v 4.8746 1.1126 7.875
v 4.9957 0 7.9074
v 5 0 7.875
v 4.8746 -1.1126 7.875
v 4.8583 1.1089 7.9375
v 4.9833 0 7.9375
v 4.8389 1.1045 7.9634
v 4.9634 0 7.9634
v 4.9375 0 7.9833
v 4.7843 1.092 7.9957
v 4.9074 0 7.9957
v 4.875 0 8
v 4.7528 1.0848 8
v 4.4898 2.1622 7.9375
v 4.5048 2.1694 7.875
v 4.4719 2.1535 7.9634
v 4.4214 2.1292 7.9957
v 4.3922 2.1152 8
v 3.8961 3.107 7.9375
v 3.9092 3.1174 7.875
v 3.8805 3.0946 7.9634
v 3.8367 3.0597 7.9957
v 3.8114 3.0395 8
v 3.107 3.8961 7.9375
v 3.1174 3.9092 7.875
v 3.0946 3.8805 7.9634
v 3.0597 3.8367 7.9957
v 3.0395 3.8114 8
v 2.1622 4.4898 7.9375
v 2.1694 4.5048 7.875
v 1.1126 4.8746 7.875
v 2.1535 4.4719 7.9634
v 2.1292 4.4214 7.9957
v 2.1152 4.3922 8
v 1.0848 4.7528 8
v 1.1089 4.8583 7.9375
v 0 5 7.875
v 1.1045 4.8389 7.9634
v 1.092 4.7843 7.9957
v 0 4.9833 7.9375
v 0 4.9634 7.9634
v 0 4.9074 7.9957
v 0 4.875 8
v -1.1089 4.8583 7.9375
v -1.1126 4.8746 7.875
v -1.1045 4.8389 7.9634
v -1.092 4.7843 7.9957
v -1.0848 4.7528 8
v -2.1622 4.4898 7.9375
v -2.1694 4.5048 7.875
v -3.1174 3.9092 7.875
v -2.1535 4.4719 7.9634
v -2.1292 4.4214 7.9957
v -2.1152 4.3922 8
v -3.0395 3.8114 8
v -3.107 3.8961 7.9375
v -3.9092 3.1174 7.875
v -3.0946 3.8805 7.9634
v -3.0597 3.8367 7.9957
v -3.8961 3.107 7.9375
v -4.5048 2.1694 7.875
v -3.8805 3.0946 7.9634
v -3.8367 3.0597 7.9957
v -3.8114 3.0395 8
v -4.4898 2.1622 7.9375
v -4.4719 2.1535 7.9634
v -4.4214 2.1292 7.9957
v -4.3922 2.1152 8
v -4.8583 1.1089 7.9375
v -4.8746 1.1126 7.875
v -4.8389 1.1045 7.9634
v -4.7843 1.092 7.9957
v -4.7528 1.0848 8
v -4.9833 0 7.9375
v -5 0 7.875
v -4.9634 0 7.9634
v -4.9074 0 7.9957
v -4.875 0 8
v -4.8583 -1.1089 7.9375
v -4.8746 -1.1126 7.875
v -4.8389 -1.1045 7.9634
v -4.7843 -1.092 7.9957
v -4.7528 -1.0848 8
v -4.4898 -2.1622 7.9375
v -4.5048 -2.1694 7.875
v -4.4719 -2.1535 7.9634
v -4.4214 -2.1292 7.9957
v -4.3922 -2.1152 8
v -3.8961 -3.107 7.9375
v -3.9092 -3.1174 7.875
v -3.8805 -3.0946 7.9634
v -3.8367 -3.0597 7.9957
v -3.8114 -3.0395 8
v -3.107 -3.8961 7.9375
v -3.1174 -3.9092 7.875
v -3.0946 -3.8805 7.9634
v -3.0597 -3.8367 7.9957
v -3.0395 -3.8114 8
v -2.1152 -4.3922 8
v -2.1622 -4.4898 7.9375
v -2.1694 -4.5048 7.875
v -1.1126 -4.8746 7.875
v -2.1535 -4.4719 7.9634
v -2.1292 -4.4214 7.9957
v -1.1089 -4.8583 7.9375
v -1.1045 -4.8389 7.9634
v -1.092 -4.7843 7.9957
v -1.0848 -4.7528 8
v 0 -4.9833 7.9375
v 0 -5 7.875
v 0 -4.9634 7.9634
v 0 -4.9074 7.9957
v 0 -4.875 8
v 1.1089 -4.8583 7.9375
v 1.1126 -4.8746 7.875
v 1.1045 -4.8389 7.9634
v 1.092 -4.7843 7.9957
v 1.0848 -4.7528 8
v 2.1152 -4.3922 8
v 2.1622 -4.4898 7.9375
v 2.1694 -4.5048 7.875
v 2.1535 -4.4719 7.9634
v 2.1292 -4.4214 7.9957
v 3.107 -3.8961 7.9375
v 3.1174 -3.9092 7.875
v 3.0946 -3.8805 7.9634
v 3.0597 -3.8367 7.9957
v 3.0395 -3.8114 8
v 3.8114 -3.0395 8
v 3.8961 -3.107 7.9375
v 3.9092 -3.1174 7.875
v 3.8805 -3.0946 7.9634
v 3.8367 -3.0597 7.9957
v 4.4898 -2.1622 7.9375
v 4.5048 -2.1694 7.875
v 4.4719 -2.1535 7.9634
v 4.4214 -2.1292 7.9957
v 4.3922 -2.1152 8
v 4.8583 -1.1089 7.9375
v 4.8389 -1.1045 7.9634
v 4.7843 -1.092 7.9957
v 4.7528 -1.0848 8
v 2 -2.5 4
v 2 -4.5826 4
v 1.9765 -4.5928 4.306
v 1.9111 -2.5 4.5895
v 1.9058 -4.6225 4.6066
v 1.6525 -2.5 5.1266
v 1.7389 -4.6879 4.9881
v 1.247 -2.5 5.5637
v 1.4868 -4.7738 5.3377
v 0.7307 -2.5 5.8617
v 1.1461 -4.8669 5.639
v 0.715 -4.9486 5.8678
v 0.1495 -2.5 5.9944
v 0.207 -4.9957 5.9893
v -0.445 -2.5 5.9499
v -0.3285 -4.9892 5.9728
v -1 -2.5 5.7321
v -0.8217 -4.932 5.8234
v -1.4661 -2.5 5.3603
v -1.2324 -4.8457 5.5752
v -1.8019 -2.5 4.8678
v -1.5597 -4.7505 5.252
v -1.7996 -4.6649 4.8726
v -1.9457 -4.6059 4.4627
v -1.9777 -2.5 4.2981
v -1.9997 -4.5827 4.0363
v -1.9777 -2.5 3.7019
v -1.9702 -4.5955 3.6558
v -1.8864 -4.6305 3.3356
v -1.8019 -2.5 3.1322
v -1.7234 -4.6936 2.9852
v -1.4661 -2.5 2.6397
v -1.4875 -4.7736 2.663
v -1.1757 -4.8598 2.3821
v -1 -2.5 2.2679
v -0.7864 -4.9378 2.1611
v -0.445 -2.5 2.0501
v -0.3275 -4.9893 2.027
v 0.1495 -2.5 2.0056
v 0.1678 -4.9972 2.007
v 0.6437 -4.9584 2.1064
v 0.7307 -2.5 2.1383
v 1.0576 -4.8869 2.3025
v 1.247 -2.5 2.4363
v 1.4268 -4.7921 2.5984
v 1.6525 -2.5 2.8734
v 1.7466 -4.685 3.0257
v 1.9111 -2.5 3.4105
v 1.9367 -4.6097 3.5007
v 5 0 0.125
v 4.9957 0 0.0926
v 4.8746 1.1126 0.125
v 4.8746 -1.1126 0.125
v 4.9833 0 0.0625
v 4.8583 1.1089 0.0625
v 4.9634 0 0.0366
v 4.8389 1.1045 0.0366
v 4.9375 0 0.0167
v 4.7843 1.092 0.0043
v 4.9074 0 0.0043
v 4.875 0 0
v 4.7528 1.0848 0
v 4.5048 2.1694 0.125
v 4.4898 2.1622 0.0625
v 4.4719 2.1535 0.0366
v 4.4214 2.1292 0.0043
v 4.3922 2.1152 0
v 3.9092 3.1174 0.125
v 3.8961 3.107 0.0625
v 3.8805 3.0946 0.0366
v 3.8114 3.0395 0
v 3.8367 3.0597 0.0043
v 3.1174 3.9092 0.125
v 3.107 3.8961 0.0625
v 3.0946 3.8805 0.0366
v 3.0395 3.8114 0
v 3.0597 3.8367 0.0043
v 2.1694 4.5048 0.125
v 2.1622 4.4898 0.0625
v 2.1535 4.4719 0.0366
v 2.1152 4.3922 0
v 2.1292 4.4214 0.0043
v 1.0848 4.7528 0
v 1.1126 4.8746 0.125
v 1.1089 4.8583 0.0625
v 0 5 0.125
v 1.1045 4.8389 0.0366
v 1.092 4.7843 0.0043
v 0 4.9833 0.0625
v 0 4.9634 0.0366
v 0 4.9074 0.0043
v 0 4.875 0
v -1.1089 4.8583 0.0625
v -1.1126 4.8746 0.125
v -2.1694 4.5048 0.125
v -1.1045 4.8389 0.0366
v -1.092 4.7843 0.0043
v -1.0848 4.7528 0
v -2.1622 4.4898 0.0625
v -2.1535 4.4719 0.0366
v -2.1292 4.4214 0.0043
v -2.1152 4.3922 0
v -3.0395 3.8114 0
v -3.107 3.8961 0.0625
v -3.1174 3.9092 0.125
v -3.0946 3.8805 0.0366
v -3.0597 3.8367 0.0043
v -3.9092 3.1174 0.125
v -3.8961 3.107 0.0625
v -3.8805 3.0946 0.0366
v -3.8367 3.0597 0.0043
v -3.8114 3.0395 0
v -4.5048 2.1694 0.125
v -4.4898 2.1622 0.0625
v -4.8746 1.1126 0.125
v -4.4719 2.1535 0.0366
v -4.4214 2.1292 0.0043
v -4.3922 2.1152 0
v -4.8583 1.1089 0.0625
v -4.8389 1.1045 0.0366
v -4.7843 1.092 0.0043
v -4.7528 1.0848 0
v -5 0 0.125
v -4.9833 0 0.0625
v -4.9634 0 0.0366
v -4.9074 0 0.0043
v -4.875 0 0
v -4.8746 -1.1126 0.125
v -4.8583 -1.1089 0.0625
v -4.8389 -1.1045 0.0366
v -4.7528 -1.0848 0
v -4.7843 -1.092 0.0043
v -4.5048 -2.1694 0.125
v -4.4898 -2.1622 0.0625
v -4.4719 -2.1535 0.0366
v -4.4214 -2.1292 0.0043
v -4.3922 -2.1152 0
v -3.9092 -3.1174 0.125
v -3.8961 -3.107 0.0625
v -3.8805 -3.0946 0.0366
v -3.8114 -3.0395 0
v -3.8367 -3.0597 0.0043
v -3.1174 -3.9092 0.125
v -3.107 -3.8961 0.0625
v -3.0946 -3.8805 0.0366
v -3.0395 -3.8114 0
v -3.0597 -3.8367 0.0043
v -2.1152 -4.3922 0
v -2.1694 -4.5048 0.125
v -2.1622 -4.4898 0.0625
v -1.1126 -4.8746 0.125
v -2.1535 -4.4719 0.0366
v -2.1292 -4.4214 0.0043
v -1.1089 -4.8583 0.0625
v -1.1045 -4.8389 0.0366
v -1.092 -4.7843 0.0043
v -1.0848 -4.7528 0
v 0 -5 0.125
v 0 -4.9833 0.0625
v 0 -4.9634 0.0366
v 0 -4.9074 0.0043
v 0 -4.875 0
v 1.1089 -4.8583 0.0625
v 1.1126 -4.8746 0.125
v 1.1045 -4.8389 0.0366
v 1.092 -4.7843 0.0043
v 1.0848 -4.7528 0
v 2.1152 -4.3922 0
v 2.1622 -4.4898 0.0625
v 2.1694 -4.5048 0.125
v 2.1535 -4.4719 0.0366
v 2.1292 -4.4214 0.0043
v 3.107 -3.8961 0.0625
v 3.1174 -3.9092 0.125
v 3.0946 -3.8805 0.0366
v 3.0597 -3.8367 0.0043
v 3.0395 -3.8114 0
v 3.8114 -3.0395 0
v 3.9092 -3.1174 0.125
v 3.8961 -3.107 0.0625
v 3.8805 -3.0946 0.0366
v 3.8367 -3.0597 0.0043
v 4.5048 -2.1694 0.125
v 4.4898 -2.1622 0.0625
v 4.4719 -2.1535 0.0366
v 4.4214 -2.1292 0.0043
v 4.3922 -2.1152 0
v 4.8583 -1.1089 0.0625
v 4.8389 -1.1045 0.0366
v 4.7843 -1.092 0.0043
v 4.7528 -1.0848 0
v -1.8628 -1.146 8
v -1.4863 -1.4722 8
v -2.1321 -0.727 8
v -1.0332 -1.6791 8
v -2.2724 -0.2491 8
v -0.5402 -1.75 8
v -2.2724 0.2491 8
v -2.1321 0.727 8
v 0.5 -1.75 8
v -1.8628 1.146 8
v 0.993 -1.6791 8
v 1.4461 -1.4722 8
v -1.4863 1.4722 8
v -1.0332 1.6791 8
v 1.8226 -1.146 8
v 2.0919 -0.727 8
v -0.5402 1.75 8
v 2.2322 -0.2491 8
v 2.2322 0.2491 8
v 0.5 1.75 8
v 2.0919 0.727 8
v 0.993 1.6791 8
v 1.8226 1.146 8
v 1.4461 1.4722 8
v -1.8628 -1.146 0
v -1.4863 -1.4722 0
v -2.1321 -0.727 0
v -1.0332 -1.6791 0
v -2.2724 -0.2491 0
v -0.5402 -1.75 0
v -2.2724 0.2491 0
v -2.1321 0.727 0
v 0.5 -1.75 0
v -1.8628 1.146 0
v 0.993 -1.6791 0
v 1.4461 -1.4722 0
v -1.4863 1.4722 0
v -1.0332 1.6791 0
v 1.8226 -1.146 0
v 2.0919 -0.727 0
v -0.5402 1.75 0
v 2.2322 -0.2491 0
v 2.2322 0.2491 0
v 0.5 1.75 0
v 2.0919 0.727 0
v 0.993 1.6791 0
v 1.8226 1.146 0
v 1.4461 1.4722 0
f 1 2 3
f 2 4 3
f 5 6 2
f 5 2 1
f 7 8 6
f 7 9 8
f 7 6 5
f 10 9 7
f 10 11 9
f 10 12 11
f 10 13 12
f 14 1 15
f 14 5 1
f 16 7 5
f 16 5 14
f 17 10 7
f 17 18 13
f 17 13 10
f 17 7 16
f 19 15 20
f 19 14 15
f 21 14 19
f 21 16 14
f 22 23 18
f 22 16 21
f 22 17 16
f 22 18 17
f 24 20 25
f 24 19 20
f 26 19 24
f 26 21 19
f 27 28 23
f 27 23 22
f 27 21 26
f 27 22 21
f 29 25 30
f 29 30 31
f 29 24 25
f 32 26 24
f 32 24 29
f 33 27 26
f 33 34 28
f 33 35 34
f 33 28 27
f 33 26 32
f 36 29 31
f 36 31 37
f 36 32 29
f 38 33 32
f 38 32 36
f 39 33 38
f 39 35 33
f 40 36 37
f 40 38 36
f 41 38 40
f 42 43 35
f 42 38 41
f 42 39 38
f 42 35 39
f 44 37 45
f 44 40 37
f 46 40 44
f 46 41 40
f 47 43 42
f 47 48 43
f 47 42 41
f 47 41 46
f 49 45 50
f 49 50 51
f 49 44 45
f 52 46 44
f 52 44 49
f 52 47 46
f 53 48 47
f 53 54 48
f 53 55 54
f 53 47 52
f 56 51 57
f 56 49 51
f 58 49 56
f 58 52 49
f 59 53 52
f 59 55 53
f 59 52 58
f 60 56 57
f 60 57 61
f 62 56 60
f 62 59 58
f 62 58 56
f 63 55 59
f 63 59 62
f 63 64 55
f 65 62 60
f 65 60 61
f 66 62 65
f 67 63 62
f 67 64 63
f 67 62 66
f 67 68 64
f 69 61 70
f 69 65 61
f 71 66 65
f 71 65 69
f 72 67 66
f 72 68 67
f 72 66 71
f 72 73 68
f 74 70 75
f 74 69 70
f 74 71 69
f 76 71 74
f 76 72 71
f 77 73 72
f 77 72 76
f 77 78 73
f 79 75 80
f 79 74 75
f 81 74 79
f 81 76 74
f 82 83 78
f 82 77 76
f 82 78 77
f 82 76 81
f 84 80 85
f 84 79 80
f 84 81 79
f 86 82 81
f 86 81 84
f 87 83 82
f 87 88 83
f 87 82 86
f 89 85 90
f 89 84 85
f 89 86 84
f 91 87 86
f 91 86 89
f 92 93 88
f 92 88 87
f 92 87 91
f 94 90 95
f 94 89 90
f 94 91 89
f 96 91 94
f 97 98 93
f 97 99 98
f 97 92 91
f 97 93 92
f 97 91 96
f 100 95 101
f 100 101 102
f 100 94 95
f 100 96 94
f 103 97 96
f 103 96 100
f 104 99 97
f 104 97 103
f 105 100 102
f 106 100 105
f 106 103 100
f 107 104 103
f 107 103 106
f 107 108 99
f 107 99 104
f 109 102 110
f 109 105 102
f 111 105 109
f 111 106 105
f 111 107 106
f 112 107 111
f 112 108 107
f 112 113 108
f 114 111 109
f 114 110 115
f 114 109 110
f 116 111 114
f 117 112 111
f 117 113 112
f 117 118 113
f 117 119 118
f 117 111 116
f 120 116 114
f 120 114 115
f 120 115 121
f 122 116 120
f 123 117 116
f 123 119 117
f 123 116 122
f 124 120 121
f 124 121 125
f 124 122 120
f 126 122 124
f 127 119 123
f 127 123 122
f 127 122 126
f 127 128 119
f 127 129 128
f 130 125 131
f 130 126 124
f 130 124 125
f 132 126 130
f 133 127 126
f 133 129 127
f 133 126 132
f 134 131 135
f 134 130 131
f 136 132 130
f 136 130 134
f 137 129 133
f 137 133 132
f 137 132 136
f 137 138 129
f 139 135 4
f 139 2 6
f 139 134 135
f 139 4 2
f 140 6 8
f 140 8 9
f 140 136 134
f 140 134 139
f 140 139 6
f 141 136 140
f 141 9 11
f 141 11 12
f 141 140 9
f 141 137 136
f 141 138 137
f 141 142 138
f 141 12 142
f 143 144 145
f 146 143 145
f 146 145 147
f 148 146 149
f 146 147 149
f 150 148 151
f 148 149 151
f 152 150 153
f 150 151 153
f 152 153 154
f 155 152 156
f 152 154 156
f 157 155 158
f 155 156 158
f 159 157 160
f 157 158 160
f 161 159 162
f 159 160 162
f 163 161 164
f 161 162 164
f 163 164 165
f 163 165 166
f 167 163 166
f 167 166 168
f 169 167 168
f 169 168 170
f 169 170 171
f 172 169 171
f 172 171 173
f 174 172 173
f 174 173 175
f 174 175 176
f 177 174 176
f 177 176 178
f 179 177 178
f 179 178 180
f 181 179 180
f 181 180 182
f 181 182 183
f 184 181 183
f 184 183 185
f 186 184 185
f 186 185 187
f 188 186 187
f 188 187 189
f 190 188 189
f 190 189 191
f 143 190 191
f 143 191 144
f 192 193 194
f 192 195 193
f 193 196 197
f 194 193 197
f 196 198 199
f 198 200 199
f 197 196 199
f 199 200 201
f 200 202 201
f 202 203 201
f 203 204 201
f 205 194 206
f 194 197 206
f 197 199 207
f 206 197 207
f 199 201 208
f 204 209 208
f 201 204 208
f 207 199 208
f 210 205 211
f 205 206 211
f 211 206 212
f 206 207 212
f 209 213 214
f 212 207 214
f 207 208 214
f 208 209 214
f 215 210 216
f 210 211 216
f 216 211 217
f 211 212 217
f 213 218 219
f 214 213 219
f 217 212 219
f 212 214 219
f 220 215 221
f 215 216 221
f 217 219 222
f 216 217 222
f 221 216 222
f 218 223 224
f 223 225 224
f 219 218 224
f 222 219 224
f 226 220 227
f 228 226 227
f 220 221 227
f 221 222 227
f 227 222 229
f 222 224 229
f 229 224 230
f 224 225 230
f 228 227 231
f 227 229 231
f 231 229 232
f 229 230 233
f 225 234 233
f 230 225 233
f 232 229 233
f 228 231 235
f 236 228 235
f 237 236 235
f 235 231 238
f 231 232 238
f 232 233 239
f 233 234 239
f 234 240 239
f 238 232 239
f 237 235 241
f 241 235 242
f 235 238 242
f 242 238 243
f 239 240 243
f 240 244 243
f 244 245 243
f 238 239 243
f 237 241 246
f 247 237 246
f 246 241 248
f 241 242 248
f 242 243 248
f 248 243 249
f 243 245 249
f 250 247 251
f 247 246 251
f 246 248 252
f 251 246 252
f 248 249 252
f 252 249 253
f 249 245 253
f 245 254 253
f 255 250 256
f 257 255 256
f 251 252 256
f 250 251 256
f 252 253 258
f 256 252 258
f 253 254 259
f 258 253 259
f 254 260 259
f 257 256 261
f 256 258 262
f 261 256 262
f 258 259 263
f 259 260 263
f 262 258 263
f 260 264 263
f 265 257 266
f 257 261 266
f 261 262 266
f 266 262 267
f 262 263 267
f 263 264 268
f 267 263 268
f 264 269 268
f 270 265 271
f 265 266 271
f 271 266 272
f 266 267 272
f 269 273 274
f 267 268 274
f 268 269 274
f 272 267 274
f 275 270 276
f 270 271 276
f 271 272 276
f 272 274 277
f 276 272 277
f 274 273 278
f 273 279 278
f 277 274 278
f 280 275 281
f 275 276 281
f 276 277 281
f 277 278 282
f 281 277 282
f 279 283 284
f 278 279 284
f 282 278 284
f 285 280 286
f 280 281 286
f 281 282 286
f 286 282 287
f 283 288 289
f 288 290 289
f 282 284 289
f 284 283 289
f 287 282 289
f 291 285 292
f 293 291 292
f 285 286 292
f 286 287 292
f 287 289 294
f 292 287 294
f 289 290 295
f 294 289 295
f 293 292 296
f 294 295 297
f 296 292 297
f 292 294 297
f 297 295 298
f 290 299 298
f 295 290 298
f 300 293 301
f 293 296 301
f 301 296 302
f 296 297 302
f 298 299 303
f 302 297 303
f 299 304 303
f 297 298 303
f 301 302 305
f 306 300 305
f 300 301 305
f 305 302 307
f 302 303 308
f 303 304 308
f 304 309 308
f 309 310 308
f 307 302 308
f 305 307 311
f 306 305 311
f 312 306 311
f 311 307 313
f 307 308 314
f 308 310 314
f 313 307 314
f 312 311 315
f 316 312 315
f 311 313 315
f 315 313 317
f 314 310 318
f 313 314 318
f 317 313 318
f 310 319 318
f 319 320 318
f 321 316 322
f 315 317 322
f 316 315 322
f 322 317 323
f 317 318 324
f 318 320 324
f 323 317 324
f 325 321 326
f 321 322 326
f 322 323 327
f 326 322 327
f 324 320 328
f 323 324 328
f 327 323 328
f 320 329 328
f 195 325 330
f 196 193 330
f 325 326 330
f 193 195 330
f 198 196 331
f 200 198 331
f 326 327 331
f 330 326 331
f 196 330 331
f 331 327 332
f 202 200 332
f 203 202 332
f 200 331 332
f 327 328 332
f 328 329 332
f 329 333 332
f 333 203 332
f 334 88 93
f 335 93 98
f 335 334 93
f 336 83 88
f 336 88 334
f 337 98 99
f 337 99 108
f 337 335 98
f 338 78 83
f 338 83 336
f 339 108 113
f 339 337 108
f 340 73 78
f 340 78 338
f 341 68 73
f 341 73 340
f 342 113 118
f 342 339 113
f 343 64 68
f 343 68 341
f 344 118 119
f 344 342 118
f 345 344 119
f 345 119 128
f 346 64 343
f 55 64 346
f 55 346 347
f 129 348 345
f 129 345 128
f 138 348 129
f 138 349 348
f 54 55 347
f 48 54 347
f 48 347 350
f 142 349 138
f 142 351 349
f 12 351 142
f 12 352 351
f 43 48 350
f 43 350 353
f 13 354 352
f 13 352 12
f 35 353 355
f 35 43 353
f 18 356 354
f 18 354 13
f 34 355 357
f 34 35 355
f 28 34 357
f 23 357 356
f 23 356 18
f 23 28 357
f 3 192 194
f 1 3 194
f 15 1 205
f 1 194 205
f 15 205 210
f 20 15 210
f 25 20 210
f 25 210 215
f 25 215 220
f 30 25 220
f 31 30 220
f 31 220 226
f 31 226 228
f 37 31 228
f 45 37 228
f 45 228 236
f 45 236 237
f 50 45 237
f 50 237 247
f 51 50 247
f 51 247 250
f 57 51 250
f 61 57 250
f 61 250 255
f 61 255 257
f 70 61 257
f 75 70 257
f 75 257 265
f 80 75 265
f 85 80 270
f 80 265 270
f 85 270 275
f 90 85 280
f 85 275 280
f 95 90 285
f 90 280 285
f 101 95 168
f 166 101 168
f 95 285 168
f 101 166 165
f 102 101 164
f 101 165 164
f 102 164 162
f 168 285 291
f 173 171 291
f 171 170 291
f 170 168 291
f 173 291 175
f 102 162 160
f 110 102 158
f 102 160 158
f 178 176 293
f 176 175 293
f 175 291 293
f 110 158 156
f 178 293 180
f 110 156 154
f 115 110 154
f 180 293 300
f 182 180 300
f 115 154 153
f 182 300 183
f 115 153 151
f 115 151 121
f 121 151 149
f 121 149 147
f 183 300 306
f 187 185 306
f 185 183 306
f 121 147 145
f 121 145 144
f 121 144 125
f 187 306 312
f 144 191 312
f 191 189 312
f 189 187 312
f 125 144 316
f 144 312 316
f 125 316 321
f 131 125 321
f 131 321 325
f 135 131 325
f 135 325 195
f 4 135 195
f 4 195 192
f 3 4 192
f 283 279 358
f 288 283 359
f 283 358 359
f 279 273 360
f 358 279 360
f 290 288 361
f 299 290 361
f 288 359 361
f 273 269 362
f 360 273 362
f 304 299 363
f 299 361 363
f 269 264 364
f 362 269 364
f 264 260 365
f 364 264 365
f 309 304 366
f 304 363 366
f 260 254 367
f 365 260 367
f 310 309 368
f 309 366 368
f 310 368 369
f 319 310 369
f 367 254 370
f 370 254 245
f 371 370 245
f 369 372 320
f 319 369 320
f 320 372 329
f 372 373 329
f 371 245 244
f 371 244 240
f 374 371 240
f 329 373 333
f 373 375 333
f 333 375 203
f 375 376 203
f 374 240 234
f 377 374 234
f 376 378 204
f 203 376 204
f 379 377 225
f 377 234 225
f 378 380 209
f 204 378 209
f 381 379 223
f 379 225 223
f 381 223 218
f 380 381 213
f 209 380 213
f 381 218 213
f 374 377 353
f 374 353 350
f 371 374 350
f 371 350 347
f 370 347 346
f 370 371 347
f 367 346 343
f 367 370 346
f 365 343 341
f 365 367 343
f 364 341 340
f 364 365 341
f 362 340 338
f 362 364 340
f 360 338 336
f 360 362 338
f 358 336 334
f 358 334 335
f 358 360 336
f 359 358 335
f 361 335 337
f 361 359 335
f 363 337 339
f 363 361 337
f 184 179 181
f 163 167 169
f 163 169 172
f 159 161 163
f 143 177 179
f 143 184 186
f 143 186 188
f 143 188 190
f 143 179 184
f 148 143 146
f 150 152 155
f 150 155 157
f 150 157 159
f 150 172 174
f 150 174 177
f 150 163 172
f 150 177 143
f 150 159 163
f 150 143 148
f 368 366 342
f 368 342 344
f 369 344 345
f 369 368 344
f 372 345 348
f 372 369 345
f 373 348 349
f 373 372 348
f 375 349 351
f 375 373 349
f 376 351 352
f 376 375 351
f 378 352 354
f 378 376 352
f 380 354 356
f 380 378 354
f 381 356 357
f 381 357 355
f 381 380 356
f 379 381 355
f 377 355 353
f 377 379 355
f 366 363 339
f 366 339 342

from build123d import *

# Parameters (mm, degrees)
SKETCH1_R           = 5
BOSS_EXTRUDE1_DEPTH = 8
FILLET1_R           = 0.125
SKETCH4_R           = 2
CUT_EXTRUDE1_DEPTH  = 2.5


with BuildPart() as part:
    # Sketch1 → Boss-Extrude1 (new body)
    with BuildSketch(Plane.XY):
        Circle(SKETCH1_R)
        with BuildLine():
            ThreePointArc((0.5, -1.75), (2.25, 0), (0.5, 1.75))
            Line((0.5, 1.75), (-0.5402042, 1.75))
            ThreePointArc((-0.5402042, 1.75), (-2.2902042, 0), (-0.5402042, -1.75))
            Line((-0.5402042, -1.75), (0.5, -1.75))
        make_face(mode=Mode.SUBTRACT)
    extrude(amount=BOSS_EXTRUDE1_DEPTH)

    # Fillet1
    fillet1_edges = [part.edges().sort_by_distance(p)[0] for p in [
        (-5, 0, 8),
        (-5, 0, 0),
    ]]
    fillet(fillet1_edges, radius=FILLET1_R)

    # Sketch4 → Cut-Extrude1 (cut)
    with BuildSketch(Plane.XZ.offset(5)):
        with Locations((0, 4)):
            Circle(SKETCH4_R)
    extrude(amount=-CUT_EXTRUDE1_DEPTH, mode=Mode.SUBTRACT)


solid = part.part
